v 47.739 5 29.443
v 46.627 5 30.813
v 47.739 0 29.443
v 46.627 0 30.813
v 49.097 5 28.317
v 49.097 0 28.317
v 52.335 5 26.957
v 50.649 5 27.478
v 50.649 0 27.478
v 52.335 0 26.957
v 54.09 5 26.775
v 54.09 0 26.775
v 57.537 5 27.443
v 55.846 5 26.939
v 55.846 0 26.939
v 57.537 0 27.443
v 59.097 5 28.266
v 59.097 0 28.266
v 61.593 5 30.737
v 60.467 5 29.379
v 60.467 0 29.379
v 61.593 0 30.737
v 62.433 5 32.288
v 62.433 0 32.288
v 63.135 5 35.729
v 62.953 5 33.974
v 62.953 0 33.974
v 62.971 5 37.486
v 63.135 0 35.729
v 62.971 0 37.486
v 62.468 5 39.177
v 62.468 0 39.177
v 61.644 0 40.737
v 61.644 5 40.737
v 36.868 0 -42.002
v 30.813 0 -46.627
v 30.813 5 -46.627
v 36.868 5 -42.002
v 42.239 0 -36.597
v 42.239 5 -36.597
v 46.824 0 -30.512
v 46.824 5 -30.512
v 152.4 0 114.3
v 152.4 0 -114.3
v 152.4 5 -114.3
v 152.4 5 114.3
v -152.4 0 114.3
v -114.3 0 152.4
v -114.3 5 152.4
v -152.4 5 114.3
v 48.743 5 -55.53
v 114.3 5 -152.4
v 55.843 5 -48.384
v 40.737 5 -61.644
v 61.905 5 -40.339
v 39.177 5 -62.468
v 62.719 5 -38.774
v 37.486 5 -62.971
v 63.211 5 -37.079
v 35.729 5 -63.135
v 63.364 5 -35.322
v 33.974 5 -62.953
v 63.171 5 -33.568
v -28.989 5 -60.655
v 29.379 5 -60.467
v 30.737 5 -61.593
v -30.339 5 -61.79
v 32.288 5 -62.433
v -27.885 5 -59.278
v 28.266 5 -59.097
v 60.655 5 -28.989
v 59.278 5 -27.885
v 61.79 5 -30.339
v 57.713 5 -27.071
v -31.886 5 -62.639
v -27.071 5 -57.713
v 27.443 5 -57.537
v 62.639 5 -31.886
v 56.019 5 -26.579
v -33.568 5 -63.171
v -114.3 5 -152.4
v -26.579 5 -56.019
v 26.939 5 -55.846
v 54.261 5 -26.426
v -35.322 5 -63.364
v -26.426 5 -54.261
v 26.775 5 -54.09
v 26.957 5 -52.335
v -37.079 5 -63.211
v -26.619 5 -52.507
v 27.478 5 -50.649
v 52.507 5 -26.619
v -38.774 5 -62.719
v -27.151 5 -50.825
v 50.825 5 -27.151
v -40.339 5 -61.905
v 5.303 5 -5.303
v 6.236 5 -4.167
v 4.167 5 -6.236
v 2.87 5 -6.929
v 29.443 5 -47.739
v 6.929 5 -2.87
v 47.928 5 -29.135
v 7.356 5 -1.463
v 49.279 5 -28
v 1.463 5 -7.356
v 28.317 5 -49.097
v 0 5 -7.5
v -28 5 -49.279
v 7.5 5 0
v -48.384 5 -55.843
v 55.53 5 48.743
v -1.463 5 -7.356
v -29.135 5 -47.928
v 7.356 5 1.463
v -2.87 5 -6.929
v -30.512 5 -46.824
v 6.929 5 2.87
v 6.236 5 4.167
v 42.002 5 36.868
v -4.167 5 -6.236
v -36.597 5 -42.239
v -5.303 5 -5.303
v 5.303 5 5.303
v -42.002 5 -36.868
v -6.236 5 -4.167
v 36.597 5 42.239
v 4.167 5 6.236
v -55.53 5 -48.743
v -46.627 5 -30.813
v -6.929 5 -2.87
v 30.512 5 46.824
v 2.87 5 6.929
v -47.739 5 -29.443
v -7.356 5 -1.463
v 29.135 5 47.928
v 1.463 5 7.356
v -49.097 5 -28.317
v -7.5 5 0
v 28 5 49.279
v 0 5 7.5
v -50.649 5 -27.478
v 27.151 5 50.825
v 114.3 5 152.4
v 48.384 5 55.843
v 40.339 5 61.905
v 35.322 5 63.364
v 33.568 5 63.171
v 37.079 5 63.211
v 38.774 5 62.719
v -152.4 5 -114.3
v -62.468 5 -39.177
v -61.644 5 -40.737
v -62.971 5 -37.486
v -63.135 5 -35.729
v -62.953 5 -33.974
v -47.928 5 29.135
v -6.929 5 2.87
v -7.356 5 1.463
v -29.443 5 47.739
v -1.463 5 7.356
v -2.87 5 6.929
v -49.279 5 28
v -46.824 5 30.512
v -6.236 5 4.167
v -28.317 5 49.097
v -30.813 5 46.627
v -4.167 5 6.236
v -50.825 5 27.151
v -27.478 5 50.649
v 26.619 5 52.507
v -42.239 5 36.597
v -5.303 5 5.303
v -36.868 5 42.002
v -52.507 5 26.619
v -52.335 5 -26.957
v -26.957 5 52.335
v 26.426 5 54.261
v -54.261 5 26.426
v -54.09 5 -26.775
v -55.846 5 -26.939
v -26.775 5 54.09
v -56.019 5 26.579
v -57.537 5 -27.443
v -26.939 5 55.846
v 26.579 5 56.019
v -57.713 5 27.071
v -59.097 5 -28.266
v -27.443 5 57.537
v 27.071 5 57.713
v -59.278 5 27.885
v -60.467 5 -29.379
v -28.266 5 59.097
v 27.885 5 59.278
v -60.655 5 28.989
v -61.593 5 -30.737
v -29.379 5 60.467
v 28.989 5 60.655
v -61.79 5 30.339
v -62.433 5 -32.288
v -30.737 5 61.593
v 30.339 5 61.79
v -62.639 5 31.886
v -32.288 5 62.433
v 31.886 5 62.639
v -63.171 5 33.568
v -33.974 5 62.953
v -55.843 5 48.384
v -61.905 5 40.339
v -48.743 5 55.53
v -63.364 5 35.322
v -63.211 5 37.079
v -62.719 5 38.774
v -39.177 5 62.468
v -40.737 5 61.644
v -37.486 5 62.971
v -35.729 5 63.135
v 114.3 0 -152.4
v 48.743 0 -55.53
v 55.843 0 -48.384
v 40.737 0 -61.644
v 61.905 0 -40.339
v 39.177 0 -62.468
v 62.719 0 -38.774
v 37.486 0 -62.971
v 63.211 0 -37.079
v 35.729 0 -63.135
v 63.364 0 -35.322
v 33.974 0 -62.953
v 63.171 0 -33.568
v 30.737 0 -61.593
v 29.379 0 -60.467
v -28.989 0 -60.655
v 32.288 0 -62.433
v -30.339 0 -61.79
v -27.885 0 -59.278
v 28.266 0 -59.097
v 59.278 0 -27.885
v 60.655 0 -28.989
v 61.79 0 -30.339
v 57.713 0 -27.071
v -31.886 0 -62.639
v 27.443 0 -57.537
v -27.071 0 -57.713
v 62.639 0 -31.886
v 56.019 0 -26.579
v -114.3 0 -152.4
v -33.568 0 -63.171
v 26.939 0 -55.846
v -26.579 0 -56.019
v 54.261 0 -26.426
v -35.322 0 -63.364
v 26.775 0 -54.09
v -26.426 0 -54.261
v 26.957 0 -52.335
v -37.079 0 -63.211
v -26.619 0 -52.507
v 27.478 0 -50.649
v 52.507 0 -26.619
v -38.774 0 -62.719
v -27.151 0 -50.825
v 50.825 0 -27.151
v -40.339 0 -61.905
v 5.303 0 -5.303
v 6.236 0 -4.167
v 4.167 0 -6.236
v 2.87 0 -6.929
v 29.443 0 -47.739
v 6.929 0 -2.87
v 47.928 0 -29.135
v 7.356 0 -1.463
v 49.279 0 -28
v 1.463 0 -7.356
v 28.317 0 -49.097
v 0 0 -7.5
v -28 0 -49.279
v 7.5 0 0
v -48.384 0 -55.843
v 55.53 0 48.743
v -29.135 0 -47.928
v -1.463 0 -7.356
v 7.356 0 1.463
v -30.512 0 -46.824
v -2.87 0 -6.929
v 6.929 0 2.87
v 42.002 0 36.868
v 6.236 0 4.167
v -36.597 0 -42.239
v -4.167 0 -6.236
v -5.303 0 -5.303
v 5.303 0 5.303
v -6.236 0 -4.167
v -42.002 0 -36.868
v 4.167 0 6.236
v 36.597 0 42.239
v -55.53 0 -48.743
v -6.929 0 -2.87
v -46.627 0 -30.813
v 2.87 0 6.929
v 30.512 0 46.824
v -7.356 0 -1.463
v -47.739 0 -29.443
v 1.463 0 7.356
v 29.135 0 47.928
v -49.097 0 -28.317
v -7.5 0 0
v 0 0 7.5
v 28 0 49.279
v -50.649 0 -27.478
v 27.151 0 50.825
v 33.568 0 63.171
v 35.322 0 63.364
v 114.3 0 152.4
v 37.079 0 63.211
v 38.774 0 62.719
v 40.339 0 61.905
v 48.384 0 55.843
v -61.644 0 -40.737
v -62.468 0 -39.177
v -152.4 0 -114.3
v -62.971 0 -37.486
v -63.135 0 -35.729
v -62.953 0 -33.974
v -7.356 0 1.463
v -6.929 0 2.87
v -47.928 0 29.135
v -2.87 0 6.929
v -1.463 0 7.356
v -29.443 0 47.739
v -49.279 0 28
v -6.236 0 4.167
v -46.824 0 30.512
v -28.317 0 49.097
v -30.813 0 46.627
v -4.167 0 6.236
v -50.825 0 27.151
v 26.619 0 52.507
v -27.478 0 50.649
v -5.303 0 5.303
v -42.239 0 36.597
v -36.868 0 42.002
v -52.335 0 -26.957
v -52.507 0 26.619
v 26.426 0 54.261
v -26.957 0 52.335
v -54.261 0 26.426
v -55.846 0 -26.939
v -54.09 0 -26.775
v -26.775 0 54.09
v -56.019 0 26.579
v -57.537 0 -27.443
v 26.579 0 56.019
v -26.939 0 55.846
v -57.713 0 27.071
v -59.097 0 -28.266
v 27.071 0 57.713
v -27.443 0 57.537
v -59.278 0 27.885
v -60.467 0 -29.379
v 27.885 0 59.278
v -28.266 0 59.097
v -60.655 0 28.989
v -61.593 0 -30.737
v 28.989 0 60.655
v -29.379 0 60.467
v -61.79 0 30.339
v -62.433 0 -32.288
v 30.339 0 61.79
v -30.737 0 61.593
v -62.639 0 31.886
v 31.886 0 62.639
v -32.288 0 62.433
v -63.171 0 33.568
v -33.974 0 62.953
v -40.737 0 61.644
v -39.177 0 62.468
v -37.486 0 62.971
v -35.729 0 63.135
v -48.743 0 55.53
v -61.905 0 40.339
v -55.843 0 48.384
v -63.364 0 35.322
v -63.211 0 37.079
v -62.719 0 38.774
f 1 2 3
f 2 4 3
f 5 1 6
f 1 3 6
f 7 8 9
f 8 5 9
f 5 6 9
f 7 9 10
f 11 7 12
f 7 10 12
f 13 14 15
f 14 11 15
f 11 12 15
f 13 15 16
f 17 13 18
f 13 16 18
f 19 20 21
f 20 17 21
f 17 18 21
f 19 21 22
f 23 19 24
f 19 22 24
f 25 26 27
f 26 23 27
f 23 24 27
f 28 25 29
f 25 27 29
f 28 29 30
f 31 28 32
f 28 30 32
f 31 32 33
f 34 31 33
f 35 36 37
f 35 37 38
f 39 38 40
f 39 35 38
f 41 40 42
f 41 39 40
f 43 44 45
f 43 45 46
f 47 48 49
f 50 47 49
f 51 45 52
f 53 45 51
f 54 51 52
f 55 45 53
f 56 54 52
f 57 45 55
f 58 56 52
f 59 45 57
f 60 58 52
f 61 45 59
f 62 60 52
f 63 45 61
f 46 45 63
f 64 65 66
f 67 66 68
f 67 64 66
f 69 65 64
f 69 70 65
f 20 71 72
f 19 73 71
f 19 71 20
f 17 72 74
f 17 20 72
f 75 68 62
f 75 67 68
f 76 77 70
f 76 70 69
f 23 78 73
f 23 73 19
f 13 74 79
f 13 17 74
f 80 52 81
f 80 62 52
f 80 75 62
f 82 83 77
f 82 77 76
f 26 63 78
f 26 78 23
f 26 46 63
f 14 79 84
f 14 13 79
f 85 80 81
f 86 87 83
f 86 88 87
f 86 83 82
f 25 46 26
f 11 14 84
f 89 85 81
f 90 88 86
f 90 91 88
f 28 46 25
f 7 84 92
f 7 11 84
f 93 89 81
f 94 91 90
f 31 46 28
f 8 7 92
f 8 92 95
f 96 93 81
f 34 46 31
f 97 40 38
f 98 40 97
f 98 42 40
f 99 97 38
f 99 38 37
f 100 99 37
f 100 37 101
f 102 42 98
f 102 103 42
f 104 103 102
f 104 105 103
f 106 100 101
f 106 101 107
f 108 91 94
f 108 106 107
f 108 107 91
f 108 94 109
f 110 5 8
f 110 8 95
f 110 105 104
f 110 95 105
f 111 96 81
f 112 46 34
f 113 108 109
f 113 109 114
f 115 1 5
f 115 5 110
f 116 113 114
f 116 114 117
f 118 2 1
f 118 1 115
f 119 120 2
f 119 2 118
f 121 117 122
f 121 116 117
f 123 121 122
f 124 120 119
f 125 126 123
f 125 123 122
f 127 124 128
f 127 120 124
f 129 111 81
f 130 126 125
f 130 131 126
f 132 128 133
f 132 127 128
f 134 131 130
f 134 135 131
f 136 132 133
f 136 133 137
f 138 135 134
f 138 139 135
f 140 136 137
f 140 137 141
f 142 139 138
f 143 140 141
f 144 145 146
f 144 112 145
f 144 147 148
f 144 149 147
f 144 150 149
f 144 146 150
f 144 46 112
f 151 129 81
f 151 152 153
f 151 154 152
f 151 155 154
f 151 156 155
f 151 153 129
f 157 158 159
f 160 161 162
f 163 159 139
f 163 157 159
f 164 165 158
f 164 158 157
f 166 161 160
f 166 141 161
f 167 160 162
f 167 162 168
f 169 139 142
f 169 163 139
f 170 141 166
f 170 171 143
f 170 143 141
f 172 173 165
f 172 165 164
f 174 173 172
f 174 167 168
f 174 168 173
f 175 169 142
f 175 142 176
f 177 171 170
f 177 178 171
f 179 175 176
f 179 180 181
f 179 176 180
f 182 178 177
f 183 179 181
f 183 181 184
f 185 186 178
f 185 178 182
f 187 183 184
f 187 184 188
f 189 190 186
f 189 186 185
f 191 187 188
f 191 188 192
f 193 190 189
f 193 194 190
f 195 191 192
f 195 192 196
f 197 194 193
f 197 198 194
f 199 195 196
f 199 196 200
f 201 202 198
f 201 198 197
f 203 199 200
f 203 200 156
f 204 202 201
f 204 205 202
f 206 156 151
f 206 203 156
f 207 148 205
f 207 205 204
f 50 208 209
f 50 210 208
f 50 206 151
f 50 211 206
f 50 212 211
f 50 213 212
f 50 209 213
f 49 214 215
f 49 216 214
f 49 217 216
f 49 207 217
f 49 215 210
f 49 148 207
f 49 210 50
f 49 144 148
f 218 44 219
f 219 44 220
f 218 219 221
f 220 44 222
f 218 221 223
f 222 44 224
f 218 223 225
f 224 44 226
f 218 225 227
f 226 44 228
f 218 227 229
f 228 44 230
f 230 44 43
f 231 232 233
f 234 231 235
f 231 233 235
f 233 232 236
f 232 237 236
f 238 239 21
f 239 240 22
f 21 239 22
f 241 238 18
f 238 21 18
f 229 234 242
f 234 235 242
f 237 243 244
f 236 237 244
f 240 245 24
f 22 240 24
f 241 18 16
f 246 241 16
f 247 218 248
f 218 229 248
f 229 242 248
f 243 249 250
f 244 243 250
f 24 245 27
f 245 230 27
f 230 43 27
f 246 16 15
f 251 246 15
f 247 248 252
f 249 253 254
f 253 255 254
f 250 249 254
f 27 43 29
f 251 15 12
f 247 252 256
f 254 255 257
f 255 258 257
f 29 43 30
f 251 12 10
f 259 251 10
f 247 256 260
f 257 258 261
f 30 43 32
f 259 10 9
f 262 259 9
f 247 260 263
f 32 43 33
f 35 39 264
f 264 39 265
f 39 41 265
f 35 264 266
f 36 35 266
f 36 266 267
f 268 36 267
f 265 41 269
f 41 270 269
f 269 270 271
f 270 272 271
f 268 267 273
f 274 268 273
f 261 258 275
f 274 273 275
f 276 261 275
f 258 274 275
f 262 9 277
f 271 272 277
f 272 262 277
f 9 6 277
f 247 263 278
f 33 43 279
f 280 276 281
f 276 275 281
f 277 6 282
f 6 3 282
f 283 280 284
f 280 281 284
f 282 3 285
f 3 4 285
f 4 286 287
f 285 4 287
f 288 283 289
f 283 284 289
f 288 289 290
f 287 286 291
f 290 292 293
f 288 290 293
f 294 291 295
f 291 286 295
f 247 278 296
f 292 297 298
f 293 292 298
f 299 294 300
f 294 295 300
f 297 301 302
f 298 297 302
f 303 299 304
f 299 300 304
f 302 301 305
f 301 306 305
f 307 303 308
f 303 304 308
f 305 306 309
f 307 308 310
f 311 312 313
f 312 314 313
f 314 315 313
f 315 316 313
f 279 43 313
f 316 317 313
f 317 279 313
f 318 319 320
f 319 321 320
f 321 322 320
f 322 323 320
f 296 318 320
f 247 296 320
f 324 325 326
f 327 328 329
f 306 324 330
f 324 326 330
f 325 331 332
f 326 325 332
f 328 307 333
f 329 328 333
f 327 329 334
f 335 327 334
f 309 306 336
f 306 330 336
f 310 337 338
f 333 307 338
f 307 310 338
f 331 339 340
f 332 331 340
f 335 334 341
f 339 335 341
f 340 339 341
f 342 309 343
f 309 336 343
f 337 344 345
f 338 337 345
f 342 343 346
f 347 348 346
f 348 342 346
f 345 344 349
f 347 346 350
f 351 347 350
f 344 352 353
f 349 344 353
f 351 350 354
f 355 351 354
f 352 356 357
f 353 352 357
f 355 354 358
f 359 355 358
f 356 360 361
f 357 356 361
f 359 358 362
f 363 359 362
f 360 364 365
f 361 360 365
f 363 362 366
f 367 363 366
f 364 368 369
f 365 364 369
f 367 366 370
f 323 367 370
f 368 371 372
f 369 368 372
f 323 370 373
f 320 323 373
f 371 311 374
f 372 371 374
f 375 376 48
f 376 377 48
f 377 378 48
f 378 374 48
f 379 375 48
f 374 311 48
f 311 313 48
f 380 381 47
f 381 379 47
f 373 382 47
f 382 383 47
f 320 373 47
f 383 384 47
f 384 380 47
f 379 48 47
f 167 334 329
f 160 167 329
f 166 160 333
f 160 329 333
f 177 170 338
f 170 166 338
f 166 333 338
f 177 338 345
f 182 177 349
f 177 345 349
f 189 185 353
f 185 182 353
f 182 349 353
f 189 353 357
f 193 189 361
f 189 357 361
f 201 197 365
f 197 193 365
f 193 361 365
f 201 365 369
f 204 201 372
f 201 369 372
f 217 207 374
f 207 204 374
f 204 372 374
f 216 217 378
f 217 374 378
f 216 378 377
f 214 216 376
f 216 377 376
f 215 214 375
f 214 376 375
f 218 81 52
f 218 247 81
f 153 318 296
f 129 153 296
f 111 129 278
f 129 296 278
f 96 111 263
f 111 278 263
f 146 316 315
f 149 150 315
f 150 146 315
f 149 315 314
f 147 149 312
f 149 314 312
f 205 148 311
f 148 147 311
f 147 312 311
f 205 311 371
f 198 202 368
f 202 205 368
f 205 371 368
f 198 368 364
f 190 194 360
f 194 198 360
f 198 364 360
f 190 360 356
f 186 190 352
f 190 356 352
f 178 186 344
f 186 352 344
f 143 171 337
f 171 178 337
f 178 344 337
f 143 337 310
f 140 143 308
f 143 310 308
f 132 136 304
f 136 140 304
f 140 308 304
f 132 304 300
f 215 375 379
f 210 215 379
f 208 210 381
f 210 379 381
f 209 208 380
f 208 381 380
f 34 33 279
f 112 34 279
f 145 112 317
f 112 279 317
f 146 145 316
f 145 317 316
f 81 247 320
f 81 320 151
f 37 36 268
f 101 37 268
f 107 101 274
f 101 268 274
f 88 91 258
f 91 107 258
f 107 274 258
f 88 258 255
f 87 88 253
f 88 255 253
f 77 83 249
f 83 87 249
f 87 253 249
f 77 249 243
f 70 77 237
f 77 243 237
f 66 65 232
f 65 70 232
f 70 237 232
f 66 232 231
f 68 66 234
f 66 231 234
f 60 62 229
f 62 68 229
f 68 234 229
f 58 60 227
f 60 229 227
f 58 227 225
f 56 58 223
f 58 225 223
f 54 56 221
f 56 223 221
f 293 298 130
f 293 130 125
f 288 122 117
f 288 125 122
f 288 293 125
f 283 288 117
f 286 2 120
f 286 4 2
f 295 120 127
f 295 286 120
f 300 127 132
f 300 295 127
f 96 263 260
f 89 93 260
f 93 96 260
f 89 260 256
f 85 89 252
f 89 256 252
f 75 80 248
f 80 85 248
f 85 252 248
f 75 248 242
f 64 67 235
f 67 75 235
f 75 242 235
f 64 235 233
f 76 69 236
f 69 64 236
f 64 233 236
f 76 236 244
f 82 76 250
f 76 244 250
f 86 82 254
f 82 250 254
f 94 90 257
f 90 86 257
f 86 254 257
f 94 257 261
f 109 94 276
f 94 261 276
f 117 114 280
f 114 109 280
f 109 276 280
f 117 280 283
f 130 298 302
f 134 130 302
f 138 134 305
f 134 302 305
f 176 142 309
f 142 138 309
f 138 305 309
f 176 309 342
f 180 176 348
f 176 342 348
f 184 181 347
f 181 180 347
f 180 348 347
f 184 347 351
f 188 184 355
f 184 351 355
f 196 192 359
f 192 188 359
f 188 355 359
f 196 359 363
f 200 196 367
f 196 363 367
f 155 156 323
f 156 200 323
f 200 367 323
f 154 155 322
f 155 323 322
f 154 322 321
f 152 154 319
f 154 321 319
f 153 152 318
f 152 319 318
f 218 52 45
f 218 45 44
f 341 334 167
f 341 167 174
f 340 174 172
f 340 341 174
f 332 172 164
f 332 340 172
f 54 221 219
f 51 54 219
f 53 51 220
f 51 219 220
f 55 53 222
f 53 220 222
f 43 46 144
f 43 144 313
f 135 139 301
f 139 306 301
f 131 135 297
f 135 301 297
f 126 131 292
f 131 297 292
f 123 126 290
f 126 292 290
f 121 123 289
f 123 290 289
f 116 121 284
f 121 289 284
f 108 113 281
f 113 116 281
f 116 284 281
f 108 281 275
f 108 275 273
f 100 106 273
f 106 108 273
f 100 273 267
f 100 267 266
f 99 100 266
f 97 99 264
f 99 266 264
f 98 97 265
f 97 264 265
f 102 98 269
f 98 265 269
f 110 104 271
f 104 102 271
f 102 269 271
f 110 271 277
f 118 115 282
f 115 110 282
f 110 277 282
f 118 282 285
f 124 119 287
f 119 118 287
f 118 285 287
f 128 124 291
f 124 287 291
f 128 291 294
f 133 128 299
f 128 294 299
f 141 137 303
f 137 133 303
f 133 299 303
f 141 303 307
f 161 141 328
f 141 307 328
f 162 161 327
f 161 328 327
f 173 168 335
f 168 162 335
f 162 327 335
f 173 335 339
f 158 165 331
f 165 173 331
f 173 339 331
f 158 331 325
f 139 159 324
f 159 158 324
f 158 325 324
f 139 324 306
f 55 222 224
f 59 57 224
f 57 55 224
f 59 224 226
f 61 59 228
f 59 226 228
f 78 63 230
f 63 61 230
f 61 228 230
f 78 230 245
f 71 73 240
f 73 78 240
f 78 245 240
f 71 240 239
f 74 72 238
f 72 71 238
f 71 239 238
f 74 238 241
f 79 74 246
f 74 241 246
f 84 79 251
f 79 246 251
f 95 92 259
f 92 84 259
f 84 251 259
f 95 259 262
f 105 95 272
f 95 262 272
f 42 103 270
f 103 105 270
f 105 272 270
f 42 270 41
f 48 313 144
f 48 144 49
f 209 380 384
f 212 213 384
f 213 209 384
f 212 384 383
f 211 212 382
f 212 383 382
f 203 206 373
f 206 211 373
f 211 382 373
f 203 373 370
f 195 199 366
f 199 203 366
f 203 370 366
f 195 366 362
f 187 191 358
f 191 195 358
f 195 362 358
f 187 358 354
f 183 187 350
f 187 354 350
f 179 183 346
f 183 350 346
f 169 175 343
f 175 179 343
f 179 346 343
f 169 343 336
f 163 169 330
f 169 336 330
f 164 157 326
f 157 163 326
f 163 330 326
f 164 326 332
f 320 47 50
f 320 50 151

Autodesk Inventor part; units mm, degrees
ref_plane "YZ Plane" through (0, 0, 0) normal (1, 0, 0) x (0, 1, 0)
ref_plane "XZ Plane" through (0, 0, 0) normal (0, 1, 0) x (-1, 0, 0)
ref_plane "XY Plane" through (0, 0, 0) normal (0, 0, 1) x (1, 0, 0)
sketch "Sketch1" plane through (0, 0, 0) normal (0, 1, 0) x (-1, 0, 0)
  line L0 (-152.4, 152.4) -> (152.4, 152.4)
  line L1 (152.4, 152.4) -> (152.4, -152.4)
  line L2 (152.4, -152.4) -> (-152.4, -152.4)
  line L3 (-152.4, -152.4) -> (-152.4, 152.4)
  line L4 (-152.4, 152.4) -> (152.4, -152.4) construction
  line L5 (152.4, 152.4) -> (-152.4, -152.4) construction
  line L6 (0, -35) -> (-30.3109, -17.5)
  line L7 (-30.3109, -17.5) -> (-30.3109, 17.5)
  line L8 (-30.3109, 17.5) -> (0, 35)
  line L9 (0, 35) -> (30.3109, 17.5)
  line L10 (30.3109, 17.5) -> (30.3109, -17.5)
  line L11 (30.3109, -17.5) -> (0, -35)
  arc A0 (54.3646, 35.4255) -> (35.7748, 54.1354) centre (0, 0) ccw construction
  arc A1 (61.905, 40.339) -> (40.7367, 61.6439) centre (0, 0) ccw
  arc A2 (46.8242, 30.5119) -> (30.8128, 46.6268) centre (0, 0) ccw
  arc A3 (46.8242, 30.5119) -> (61.905, 40.339) centre (54.3646, 35.4255) ccw
  arc A4 (40.7367, 61.6439) -> (30.8128, 46.6268) centre (35.7748, 54.1354) ccw
  arc A5 (-61.6439, 40.7367) -> (-46.6268, 30.8128) centre (-54.1354, 35.7748) ccw
  arc A6 (-30.5119, 46.8242) -> (-46.6268, 30.8128) centre (0, 0) ccw
  arc A7 (-40.339, 61.905) -> (-61.6439, 40.7367) centre (0, 0) ccw
  arc A8 (-30.5119, 46.8242) -> (-40.339, 61.905) centre (-35.4255, 54.3646) ccw
  arc A9 (-40.7367, -61.6439) -> (-30.8128, -46.6268) centre (-35.7748, -54.1354) ccw
  arc A10 (-46.8242, -30.5119) -> (-30.8128, -46.6268) centre (0, 0) ccw
  arc A11 (-61.905, -40.339) -> (-40.7367, -61.6439) centre (0, 0) ccw
  arc A12 (-46.8242, -30.5119) -> (-61.905, -40.339) centre (-54.3646, -35.4255) ccw
  arc A13 (61.6439, -40.7367) -> (46.6268, -30.8128) centre (54.1354, -35.7748) ccw
  arc A14 (30.5119, -46.8242) -> (46.6268, -30.8128) centre (0, 0) ccw
  arc A15 (40.339, -61.905) -> (61.6439, -40.7367) centre (0, 0) ccw
  arc A16 (30.5119, -46.8242) -> (40.339, -61.905) centre (35.4255, -54.3646) ccw
  circle A17 centre (0, 0) radius 7.5
  dimension "d1" = 304.8
  dimension "d2" = 304.8
  dimension "d5" = 35
  dimension "d11" = 360
  dimension "d13" = 18
  dimension "d14" = 15
extrude "Extrusion1" add sketch "Sketch1" along normal blind 5 contours L0 L1 L2 L3 | L6 L7 L8 L9 L10 L11
chamfer "Chamfer1" distance 38.1 angle 45 4 edges at (152.4, 2.5, -152.4) (-152.4, 2.5, -152.4) (-152.4, 2.5, 152.4) (152.4, 2.5, 152.4)
ref_plane "Work Plane1" through (0, 0, -17.5) normal (1, 0, 0) x (0, 0, -1)
properties part number "bottom plate"
